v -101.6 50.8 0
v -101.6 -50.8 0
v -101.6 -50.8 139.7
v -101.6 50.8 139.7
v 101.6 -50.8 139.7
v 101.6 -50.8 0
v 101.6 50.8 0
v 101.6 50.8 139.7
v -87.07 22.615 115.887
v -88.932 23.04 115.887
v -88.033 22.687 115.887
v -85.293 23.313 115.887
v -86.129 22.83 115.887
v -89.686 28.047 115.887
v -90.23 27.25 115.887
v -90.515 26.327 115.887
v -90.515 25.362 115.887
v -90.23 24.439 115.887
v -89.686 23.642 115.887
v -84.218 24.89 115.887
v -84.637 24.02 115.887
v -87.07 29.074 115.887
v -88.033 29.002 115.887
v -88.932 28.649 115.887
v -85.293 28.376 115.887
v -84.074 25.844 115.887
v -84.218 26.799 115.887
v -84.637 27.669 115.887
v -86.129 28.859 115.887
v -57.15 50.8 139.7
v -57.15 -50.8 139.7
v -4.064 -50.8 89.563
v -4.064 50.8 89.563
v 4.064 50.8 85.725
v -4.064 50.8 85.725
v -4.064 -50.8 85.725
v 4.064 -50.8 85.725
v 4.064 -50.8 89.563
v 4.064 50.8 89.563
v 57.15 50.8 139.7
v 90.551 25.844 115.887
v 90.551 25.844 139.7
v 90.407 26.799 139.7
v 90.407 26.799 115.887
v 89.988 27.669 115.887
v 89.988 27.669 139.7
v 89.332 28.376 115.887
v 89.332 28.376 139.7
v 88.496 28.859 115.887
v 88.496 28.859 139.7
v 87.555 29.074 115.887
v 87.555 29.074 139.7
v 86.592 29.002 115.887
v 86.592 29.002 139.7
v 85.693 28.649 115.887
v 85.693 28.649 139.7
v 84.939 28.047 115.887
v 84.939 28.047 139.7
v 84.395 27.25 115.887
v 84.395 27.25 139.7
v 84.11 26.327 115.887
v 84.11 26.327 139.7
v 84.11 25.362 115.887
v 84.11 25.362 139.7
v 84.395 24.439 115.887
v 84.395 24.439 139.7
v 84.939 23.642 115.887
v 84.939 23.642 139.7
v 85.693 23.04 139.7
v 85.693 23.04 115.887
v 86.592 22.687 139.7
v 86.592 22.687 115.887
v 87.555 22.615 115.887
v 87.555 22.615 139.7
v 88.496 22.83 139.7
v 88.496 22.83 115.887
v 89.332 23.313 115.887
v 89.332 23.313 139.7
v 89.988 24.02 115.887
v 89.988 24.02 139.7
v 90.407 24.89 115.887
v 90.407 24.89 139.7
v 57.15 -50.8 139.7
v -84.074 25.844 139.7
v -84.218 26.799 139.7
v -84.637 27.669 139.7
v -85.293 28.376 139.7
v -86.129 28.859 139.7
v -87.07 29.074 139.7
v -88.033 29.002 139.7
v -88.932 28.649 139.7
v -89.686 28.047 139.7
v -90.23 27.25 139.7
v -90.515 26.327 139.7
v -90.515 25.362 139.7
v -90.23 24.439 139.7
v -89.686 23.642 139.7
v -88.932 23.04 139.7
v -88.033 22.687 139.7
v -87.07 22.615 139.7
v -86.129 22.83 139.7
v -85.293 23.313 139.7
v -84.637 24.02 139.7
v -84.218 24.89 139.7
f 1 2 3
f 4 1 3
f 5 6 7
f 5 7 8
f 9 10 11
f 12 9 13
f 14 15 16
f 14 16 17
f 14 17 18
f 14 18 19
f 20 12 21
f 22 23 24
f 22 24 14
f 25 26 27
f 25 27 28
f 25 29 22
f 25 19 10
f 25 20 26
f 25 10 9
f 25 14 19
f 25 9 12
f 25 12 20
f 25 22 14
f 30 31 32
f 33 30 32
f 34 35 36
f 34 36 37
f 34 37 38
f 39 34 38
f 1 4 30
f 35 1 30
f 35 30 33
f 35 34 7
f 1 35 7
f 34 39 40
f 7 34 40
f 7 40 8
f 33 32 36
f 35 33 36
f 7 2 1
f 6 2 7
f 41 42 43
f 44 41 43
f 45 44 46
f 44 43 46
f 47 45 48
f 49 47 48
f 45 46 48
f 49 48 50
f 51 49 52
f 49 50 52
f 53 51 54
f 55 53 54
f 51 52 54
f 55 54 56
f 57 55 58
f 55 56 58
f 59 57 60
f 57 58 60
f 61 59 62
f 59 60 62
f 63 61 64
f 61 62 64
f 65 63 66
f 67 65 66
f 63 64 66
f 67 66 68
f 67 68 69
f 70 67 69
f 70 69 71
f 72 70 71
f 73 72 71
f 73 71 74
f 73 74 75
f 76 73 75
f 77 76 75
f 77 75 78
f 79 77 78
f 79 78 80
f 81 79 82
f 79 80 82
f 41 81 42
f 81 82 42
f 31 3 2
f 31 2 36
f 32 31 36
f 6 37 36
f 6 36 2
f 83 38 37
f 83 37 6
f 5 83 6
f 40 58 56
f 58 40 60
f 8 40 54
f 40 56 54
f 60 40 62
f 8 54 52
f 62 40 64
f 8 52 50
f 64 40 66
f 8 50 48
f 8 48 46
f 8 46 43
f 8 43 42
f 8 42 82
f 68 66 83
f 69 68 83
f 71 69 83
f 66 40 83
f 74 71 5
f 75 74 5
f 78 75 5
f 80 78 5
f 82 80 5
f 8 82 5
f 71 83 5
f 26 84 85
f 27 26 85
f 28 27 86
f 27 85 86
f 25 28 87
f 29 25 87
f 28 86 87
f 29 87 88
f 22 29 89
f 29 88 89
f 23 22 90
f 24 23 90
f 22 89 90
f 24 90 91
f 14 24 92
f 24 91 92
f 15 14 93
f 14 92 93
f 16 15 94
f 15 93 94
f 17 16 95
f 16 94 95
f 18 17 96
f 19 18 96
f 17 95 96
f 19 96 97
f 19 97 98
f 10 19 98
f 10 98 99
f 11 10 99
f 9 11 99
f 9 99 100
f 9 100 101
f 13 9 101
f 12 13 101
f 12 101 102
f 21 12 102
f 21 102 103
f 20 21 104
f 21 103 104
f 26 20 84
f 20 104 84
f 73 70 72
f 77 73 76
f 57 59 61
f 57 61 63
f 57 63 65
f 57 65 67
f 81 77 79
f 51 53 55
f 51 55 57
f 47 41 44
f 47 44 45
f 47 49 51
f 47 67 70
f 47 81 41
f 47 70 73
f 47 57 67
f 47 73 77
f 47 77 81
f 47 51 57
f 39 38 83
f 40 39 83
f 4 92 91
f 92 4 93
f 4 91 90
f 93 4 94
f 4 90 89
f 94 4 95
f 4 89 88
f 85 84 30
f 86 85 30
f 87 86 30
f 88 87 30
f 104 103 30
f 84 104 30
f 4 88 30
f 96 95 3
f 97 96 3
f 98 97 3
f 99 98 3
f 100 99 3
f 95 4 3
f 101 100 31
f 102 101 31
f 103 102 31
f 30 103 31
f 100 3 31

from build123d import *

# Parameters (mm, degrees)
F0_W     = 203.2
F0_H     = 139.7
F1_DEPTH = 50.8
F3_DEPTH = 101.601
F5_DEPTH = 101.601
F6_R     = 3.2385
F7_DEPTH = 23.8125


with BuildPart() as f1:
    # F0 (on Front) → F1 (new body, symmetric)
    with BuildSketch(Plane.XZ):
        with Locations((0, 69.85)):
            Rectangle(F0_W, F0_H)
    extrude(amount=F1_DEPTH, both=True)

    # F2 (on face) → F3 (cut, through all)
    with BuildSketch(Plane.XZ.offset(50.8)):
        Polygon((57.15, 139.7), (0, 139.7), (0, 85.725), align=None)
        Polygon((0, 85.725), (0, 139.7), (-57.15, 139.7), align=None)
    extrude(amount=-F3_DEPTH, mode=Mode.SUBTRACT)

    # F4 (on face) → F5 (cut, through all)
    with BuildSketch(Plane.XZ.offset(50.8)):
        Polygon((-4.064, 90.043), (-4.064, 85.725), (4.064, 85.725), (4.064, 90.043), (0, 90.043), align=None)
    extrude(amount=-F5_DEPTH, mode=Mode.SUBTRACT)

    # F6 (on face) → F7 (cut)
    with BuildSketch(Plane.XY.offset(139.7)):
        with Locations((-87.3125, 25.8445)):
            Circle(F6_R)
        with Locations((87.3125, 25.8445)):
            Circle(F6_R)
    extrude(amount=-F7_DEPTH, mode=Mode.SUBTRACT)


solid = f1.part
